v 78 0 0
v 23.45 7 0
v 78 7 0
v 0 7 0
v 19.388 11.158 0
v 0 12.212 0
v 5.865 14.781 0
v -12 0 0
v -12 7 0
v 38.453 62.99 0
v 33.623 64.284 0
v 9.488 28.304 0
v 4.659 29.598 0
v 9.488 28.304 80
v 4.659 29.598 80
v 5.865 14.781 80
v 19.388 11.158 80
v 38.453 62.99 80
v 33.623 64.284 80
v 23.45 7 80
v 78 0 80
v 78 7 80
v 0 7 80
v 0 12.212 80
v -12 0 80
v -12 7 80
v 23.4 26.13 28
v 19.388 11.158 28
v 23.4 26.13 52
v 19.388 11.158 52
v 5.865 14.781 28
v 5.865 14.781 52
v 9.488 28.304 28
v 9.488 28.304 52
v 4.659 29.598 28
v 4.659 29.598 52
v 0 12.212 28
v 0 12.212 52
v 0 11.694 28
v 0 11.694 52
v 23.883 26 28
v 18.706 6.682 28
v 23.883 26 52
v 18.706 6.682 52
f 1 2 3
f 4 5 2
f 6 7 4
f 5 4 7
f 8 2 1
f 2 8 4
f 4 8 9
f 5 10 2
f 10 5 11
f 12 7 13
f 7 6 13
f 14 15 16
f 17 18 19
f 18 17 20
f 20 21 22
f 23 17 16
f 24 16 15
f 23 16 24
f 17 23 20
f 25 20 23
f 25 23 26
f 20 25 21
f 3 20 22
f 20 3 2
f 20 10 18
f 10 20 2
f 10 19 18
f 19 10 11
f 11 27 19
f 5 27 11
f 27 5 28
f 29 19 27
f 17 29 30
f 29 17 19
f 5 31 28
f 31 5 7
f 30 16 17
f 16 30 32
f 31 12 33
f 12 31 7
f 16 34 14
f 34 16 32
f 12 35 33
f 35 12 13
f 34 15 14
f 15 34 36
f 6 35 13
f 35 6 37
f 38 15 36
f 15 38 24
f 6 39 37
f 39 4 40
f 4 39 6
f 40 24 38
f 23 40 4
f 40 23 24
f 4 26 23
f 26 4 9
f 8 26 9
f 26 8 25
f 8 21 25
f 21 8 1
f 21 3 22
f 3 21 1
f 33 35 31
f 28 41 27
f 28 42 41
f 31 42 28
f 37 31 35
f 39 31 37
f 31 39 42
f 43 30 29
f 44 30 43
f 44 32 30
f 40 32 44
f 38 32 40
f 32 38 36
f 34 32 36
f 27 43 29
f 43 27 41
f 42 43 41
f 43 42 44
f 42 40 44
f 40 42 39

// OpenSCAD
// Scanning Rig - Generic leaning phone stand
// Render this file to generate phone_stand.stl
//
// No rotate([-90, 0, 0]) here: the stand is an extruded side profile whose
// "up" is already +Y, so the STL is simultaneously in print orientation and
// upright in the Y-up Three.js viewer.

include <_scanning_rig.scad>

phone_stand();
